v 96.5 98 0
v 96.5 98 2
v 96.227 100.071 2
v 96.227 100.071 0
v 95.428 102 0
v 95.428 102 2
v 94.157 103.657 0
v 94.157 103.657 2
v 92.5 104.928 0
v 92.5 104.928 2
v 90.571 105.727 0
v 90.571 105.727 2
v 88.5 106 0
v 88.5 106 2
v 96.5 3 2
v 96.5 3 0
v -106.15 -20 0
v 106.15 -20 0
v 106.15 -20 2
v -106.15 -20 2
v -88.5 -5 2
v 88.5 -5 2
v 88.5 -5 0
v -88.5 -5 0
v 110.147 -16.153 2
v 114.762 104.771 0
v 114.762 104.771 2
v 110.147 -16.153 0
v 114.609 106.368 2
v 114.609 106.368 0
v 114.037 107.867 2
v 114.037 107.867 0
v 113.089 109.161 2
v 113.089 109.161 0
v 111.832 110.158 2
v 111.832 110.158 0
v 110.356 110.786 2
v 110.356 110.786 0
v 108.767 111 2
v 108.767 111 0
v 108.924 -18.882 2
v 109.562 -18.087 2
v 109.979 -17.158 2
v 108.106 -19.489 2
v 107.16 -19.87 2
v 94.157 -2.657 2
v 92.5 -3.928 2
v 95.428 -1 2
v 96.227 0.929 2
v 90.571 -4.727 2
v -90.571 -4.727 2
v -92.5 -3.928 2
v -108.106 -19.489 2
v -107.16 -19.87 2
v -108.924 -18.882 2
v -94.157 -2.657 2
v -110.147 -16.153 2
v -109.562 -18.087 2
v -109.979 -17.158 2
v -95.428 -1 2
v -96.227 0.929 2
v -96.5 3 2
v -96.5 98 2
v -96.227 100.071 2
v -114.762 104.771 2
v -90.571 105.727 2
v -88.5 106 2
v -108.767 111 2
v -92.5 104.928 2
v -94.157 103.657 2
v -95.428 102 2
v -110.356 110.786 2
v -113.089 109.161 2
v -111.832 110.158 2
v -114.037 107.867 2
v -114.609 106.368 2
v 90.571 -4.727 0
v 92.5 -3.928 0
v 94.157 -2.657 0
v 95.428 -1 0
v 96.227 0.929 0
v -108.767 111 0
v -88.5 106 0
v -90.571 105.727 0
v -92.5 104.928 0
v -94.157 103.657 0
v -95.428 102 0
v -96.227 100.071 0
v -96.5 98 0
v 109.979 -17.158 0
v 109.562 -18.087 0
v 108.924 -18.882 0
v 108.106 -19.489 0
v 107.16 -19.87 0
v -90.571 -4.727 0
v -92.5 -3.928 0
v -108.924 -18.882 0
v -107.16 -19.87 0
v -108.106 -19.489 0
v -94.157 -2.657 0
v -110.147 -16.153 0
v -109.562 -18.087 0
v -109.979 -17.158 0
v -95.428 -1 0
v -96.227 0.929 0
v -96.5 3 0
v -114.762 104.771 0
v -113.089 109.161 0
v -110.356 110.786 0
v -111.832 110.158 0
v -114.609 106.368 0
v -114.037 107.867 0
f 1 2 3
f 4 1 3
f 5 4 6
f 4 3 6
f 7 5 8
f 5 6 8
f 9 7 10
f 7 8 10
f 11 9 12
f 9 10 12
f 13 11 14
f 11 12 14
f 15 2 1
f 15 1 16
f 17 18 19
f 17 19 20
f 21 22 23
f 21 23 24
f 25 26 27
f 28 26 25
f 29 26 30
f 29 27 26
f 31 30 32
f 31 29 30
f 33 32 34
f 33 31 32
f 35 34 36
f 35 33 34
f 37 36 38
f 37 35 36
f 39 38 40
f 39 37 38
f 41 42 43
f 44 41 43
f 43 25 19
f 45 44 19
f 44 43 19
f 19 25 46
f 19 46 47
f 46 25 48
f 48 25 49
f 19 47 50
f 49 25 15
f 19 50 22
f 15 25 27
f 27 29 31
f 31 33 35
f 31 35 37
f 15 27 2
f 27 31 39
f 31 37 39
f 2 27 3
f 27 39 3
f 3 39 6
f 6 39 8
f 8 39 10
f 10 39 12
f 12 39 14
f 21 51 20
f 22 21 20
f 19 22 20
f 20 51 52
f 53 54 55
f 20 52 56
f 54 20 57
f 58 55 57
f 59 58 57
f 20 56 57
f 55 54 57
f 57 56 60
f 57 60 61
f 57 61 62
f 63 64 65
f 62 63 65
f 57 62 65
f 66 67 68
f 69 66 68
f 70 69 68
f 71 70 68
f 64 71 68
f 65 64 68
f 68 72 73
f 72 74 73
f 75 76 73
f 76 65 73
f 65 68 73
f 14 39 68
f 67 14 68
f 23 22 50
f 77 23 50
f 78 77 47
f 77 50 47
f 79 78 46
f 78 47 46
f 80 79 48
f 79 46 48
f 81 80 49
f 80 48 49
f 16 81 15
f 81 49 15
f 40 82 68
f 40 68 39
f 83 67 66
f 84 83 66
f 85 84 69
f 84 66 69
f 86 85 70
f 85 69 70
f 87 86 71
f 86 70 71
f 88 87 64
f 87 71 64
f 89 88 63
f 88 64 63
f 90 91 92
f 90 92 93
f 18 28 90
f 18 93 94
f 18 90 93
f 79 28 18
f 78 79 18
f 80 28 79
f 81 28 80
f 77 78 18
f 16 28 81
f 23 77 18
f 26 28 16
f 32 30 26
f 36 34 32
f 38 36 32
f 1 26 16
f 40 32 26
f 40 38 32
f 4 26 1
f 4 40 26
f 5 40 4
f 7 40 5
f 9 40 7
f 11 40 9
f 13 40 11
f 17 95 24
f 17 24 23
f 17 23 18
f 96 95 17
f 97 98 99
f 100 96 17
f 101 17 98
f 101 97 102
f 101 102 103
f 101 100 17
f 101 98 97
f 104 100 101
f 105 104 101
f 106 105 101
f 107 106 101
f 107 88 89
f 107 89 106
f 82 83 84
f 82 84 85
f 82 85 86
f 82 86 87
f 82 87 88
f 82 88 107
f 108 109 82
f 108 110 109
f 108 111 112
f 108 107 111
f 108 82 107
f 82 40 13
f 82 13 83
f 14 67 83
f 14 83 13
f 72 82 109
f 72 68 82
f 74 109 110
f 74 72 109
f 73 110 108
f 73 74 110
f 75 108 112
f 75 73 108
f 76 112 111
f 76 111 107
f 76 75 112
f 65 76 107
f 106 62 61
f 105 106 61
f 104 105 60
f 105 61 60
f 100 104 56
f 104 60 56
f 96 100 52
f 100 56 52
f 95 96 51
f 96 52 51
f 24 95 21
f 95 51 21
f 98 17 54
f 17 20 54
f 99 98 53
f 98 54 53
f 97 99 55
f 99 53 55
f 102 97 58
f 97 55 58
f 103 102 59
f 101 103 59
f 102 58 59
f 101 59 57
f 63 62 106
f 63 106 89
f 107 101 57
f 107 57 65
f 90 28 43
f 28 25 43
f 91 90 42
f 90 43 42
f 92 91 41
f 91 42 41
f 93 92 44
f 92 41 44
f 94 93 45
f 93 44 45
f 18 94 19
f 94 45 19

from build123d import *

# Parameters (mm, degrees)
PAD_DEPTH    = 2
FILLET_R     = 4
FILLET001_R  = 6
POCKET_DEPTH = 5


with BuildPart() as part:
    # Sketch → Pad (new body)
    with BuildSketch(Plane.XY):
        Polygon((-115, 111), (115, 111), (110, -20), (-110, -20), align=None)
    extrude(amount=PAD_DEPTH)

    # Fillet
    fillet_edges = [part.edges().sort_by_distance(p)[0] for p in [
        (-110, -20, 1),
        (110, -20, 1),
    ]]
    fillet(fillet_edges, radius=FILLET_R)

    # Fillet001
    fillet001_edges = [part.edges().sort_by_distance(p)[0] for p in [
        (-115, 111, 1),
        (115, 111, 1),
    ]]
    fillet(fillet001_edges, radius=FILLET001_R)

    # Sketch001 (on Face5 of Fillet001) → Pocket (cut)
    with BuildSketch(Plane.XY.offset(2)):
        with BuildLine():
            Line((-88.5, 106), (88.5, 106))
            ThreePointArc((96.5, 98), (94.156854, 103.656854), (88.5, 106))
            Line((96.5, 98), (96.5, 3))
            ThreePointArc((88.5, -5), (94.156854, -2.656854), (96.5, 3))
            Line((88.5, -5), (-88.5, -5))
            ThreePointArc((-96.5, 3), (-94.156854, -2.656854), (-88.5, -5))
            Line((-96.5, 3), (-96.5, 98))
            ThreePointArc((-88.5, 106), (-94.156854, 103.656854), (-96.5, 98))
        make_face()
    extrude(amount=-POCKET_DEPTH, mode=Mode.SUBTRACT)


solid = part.part
